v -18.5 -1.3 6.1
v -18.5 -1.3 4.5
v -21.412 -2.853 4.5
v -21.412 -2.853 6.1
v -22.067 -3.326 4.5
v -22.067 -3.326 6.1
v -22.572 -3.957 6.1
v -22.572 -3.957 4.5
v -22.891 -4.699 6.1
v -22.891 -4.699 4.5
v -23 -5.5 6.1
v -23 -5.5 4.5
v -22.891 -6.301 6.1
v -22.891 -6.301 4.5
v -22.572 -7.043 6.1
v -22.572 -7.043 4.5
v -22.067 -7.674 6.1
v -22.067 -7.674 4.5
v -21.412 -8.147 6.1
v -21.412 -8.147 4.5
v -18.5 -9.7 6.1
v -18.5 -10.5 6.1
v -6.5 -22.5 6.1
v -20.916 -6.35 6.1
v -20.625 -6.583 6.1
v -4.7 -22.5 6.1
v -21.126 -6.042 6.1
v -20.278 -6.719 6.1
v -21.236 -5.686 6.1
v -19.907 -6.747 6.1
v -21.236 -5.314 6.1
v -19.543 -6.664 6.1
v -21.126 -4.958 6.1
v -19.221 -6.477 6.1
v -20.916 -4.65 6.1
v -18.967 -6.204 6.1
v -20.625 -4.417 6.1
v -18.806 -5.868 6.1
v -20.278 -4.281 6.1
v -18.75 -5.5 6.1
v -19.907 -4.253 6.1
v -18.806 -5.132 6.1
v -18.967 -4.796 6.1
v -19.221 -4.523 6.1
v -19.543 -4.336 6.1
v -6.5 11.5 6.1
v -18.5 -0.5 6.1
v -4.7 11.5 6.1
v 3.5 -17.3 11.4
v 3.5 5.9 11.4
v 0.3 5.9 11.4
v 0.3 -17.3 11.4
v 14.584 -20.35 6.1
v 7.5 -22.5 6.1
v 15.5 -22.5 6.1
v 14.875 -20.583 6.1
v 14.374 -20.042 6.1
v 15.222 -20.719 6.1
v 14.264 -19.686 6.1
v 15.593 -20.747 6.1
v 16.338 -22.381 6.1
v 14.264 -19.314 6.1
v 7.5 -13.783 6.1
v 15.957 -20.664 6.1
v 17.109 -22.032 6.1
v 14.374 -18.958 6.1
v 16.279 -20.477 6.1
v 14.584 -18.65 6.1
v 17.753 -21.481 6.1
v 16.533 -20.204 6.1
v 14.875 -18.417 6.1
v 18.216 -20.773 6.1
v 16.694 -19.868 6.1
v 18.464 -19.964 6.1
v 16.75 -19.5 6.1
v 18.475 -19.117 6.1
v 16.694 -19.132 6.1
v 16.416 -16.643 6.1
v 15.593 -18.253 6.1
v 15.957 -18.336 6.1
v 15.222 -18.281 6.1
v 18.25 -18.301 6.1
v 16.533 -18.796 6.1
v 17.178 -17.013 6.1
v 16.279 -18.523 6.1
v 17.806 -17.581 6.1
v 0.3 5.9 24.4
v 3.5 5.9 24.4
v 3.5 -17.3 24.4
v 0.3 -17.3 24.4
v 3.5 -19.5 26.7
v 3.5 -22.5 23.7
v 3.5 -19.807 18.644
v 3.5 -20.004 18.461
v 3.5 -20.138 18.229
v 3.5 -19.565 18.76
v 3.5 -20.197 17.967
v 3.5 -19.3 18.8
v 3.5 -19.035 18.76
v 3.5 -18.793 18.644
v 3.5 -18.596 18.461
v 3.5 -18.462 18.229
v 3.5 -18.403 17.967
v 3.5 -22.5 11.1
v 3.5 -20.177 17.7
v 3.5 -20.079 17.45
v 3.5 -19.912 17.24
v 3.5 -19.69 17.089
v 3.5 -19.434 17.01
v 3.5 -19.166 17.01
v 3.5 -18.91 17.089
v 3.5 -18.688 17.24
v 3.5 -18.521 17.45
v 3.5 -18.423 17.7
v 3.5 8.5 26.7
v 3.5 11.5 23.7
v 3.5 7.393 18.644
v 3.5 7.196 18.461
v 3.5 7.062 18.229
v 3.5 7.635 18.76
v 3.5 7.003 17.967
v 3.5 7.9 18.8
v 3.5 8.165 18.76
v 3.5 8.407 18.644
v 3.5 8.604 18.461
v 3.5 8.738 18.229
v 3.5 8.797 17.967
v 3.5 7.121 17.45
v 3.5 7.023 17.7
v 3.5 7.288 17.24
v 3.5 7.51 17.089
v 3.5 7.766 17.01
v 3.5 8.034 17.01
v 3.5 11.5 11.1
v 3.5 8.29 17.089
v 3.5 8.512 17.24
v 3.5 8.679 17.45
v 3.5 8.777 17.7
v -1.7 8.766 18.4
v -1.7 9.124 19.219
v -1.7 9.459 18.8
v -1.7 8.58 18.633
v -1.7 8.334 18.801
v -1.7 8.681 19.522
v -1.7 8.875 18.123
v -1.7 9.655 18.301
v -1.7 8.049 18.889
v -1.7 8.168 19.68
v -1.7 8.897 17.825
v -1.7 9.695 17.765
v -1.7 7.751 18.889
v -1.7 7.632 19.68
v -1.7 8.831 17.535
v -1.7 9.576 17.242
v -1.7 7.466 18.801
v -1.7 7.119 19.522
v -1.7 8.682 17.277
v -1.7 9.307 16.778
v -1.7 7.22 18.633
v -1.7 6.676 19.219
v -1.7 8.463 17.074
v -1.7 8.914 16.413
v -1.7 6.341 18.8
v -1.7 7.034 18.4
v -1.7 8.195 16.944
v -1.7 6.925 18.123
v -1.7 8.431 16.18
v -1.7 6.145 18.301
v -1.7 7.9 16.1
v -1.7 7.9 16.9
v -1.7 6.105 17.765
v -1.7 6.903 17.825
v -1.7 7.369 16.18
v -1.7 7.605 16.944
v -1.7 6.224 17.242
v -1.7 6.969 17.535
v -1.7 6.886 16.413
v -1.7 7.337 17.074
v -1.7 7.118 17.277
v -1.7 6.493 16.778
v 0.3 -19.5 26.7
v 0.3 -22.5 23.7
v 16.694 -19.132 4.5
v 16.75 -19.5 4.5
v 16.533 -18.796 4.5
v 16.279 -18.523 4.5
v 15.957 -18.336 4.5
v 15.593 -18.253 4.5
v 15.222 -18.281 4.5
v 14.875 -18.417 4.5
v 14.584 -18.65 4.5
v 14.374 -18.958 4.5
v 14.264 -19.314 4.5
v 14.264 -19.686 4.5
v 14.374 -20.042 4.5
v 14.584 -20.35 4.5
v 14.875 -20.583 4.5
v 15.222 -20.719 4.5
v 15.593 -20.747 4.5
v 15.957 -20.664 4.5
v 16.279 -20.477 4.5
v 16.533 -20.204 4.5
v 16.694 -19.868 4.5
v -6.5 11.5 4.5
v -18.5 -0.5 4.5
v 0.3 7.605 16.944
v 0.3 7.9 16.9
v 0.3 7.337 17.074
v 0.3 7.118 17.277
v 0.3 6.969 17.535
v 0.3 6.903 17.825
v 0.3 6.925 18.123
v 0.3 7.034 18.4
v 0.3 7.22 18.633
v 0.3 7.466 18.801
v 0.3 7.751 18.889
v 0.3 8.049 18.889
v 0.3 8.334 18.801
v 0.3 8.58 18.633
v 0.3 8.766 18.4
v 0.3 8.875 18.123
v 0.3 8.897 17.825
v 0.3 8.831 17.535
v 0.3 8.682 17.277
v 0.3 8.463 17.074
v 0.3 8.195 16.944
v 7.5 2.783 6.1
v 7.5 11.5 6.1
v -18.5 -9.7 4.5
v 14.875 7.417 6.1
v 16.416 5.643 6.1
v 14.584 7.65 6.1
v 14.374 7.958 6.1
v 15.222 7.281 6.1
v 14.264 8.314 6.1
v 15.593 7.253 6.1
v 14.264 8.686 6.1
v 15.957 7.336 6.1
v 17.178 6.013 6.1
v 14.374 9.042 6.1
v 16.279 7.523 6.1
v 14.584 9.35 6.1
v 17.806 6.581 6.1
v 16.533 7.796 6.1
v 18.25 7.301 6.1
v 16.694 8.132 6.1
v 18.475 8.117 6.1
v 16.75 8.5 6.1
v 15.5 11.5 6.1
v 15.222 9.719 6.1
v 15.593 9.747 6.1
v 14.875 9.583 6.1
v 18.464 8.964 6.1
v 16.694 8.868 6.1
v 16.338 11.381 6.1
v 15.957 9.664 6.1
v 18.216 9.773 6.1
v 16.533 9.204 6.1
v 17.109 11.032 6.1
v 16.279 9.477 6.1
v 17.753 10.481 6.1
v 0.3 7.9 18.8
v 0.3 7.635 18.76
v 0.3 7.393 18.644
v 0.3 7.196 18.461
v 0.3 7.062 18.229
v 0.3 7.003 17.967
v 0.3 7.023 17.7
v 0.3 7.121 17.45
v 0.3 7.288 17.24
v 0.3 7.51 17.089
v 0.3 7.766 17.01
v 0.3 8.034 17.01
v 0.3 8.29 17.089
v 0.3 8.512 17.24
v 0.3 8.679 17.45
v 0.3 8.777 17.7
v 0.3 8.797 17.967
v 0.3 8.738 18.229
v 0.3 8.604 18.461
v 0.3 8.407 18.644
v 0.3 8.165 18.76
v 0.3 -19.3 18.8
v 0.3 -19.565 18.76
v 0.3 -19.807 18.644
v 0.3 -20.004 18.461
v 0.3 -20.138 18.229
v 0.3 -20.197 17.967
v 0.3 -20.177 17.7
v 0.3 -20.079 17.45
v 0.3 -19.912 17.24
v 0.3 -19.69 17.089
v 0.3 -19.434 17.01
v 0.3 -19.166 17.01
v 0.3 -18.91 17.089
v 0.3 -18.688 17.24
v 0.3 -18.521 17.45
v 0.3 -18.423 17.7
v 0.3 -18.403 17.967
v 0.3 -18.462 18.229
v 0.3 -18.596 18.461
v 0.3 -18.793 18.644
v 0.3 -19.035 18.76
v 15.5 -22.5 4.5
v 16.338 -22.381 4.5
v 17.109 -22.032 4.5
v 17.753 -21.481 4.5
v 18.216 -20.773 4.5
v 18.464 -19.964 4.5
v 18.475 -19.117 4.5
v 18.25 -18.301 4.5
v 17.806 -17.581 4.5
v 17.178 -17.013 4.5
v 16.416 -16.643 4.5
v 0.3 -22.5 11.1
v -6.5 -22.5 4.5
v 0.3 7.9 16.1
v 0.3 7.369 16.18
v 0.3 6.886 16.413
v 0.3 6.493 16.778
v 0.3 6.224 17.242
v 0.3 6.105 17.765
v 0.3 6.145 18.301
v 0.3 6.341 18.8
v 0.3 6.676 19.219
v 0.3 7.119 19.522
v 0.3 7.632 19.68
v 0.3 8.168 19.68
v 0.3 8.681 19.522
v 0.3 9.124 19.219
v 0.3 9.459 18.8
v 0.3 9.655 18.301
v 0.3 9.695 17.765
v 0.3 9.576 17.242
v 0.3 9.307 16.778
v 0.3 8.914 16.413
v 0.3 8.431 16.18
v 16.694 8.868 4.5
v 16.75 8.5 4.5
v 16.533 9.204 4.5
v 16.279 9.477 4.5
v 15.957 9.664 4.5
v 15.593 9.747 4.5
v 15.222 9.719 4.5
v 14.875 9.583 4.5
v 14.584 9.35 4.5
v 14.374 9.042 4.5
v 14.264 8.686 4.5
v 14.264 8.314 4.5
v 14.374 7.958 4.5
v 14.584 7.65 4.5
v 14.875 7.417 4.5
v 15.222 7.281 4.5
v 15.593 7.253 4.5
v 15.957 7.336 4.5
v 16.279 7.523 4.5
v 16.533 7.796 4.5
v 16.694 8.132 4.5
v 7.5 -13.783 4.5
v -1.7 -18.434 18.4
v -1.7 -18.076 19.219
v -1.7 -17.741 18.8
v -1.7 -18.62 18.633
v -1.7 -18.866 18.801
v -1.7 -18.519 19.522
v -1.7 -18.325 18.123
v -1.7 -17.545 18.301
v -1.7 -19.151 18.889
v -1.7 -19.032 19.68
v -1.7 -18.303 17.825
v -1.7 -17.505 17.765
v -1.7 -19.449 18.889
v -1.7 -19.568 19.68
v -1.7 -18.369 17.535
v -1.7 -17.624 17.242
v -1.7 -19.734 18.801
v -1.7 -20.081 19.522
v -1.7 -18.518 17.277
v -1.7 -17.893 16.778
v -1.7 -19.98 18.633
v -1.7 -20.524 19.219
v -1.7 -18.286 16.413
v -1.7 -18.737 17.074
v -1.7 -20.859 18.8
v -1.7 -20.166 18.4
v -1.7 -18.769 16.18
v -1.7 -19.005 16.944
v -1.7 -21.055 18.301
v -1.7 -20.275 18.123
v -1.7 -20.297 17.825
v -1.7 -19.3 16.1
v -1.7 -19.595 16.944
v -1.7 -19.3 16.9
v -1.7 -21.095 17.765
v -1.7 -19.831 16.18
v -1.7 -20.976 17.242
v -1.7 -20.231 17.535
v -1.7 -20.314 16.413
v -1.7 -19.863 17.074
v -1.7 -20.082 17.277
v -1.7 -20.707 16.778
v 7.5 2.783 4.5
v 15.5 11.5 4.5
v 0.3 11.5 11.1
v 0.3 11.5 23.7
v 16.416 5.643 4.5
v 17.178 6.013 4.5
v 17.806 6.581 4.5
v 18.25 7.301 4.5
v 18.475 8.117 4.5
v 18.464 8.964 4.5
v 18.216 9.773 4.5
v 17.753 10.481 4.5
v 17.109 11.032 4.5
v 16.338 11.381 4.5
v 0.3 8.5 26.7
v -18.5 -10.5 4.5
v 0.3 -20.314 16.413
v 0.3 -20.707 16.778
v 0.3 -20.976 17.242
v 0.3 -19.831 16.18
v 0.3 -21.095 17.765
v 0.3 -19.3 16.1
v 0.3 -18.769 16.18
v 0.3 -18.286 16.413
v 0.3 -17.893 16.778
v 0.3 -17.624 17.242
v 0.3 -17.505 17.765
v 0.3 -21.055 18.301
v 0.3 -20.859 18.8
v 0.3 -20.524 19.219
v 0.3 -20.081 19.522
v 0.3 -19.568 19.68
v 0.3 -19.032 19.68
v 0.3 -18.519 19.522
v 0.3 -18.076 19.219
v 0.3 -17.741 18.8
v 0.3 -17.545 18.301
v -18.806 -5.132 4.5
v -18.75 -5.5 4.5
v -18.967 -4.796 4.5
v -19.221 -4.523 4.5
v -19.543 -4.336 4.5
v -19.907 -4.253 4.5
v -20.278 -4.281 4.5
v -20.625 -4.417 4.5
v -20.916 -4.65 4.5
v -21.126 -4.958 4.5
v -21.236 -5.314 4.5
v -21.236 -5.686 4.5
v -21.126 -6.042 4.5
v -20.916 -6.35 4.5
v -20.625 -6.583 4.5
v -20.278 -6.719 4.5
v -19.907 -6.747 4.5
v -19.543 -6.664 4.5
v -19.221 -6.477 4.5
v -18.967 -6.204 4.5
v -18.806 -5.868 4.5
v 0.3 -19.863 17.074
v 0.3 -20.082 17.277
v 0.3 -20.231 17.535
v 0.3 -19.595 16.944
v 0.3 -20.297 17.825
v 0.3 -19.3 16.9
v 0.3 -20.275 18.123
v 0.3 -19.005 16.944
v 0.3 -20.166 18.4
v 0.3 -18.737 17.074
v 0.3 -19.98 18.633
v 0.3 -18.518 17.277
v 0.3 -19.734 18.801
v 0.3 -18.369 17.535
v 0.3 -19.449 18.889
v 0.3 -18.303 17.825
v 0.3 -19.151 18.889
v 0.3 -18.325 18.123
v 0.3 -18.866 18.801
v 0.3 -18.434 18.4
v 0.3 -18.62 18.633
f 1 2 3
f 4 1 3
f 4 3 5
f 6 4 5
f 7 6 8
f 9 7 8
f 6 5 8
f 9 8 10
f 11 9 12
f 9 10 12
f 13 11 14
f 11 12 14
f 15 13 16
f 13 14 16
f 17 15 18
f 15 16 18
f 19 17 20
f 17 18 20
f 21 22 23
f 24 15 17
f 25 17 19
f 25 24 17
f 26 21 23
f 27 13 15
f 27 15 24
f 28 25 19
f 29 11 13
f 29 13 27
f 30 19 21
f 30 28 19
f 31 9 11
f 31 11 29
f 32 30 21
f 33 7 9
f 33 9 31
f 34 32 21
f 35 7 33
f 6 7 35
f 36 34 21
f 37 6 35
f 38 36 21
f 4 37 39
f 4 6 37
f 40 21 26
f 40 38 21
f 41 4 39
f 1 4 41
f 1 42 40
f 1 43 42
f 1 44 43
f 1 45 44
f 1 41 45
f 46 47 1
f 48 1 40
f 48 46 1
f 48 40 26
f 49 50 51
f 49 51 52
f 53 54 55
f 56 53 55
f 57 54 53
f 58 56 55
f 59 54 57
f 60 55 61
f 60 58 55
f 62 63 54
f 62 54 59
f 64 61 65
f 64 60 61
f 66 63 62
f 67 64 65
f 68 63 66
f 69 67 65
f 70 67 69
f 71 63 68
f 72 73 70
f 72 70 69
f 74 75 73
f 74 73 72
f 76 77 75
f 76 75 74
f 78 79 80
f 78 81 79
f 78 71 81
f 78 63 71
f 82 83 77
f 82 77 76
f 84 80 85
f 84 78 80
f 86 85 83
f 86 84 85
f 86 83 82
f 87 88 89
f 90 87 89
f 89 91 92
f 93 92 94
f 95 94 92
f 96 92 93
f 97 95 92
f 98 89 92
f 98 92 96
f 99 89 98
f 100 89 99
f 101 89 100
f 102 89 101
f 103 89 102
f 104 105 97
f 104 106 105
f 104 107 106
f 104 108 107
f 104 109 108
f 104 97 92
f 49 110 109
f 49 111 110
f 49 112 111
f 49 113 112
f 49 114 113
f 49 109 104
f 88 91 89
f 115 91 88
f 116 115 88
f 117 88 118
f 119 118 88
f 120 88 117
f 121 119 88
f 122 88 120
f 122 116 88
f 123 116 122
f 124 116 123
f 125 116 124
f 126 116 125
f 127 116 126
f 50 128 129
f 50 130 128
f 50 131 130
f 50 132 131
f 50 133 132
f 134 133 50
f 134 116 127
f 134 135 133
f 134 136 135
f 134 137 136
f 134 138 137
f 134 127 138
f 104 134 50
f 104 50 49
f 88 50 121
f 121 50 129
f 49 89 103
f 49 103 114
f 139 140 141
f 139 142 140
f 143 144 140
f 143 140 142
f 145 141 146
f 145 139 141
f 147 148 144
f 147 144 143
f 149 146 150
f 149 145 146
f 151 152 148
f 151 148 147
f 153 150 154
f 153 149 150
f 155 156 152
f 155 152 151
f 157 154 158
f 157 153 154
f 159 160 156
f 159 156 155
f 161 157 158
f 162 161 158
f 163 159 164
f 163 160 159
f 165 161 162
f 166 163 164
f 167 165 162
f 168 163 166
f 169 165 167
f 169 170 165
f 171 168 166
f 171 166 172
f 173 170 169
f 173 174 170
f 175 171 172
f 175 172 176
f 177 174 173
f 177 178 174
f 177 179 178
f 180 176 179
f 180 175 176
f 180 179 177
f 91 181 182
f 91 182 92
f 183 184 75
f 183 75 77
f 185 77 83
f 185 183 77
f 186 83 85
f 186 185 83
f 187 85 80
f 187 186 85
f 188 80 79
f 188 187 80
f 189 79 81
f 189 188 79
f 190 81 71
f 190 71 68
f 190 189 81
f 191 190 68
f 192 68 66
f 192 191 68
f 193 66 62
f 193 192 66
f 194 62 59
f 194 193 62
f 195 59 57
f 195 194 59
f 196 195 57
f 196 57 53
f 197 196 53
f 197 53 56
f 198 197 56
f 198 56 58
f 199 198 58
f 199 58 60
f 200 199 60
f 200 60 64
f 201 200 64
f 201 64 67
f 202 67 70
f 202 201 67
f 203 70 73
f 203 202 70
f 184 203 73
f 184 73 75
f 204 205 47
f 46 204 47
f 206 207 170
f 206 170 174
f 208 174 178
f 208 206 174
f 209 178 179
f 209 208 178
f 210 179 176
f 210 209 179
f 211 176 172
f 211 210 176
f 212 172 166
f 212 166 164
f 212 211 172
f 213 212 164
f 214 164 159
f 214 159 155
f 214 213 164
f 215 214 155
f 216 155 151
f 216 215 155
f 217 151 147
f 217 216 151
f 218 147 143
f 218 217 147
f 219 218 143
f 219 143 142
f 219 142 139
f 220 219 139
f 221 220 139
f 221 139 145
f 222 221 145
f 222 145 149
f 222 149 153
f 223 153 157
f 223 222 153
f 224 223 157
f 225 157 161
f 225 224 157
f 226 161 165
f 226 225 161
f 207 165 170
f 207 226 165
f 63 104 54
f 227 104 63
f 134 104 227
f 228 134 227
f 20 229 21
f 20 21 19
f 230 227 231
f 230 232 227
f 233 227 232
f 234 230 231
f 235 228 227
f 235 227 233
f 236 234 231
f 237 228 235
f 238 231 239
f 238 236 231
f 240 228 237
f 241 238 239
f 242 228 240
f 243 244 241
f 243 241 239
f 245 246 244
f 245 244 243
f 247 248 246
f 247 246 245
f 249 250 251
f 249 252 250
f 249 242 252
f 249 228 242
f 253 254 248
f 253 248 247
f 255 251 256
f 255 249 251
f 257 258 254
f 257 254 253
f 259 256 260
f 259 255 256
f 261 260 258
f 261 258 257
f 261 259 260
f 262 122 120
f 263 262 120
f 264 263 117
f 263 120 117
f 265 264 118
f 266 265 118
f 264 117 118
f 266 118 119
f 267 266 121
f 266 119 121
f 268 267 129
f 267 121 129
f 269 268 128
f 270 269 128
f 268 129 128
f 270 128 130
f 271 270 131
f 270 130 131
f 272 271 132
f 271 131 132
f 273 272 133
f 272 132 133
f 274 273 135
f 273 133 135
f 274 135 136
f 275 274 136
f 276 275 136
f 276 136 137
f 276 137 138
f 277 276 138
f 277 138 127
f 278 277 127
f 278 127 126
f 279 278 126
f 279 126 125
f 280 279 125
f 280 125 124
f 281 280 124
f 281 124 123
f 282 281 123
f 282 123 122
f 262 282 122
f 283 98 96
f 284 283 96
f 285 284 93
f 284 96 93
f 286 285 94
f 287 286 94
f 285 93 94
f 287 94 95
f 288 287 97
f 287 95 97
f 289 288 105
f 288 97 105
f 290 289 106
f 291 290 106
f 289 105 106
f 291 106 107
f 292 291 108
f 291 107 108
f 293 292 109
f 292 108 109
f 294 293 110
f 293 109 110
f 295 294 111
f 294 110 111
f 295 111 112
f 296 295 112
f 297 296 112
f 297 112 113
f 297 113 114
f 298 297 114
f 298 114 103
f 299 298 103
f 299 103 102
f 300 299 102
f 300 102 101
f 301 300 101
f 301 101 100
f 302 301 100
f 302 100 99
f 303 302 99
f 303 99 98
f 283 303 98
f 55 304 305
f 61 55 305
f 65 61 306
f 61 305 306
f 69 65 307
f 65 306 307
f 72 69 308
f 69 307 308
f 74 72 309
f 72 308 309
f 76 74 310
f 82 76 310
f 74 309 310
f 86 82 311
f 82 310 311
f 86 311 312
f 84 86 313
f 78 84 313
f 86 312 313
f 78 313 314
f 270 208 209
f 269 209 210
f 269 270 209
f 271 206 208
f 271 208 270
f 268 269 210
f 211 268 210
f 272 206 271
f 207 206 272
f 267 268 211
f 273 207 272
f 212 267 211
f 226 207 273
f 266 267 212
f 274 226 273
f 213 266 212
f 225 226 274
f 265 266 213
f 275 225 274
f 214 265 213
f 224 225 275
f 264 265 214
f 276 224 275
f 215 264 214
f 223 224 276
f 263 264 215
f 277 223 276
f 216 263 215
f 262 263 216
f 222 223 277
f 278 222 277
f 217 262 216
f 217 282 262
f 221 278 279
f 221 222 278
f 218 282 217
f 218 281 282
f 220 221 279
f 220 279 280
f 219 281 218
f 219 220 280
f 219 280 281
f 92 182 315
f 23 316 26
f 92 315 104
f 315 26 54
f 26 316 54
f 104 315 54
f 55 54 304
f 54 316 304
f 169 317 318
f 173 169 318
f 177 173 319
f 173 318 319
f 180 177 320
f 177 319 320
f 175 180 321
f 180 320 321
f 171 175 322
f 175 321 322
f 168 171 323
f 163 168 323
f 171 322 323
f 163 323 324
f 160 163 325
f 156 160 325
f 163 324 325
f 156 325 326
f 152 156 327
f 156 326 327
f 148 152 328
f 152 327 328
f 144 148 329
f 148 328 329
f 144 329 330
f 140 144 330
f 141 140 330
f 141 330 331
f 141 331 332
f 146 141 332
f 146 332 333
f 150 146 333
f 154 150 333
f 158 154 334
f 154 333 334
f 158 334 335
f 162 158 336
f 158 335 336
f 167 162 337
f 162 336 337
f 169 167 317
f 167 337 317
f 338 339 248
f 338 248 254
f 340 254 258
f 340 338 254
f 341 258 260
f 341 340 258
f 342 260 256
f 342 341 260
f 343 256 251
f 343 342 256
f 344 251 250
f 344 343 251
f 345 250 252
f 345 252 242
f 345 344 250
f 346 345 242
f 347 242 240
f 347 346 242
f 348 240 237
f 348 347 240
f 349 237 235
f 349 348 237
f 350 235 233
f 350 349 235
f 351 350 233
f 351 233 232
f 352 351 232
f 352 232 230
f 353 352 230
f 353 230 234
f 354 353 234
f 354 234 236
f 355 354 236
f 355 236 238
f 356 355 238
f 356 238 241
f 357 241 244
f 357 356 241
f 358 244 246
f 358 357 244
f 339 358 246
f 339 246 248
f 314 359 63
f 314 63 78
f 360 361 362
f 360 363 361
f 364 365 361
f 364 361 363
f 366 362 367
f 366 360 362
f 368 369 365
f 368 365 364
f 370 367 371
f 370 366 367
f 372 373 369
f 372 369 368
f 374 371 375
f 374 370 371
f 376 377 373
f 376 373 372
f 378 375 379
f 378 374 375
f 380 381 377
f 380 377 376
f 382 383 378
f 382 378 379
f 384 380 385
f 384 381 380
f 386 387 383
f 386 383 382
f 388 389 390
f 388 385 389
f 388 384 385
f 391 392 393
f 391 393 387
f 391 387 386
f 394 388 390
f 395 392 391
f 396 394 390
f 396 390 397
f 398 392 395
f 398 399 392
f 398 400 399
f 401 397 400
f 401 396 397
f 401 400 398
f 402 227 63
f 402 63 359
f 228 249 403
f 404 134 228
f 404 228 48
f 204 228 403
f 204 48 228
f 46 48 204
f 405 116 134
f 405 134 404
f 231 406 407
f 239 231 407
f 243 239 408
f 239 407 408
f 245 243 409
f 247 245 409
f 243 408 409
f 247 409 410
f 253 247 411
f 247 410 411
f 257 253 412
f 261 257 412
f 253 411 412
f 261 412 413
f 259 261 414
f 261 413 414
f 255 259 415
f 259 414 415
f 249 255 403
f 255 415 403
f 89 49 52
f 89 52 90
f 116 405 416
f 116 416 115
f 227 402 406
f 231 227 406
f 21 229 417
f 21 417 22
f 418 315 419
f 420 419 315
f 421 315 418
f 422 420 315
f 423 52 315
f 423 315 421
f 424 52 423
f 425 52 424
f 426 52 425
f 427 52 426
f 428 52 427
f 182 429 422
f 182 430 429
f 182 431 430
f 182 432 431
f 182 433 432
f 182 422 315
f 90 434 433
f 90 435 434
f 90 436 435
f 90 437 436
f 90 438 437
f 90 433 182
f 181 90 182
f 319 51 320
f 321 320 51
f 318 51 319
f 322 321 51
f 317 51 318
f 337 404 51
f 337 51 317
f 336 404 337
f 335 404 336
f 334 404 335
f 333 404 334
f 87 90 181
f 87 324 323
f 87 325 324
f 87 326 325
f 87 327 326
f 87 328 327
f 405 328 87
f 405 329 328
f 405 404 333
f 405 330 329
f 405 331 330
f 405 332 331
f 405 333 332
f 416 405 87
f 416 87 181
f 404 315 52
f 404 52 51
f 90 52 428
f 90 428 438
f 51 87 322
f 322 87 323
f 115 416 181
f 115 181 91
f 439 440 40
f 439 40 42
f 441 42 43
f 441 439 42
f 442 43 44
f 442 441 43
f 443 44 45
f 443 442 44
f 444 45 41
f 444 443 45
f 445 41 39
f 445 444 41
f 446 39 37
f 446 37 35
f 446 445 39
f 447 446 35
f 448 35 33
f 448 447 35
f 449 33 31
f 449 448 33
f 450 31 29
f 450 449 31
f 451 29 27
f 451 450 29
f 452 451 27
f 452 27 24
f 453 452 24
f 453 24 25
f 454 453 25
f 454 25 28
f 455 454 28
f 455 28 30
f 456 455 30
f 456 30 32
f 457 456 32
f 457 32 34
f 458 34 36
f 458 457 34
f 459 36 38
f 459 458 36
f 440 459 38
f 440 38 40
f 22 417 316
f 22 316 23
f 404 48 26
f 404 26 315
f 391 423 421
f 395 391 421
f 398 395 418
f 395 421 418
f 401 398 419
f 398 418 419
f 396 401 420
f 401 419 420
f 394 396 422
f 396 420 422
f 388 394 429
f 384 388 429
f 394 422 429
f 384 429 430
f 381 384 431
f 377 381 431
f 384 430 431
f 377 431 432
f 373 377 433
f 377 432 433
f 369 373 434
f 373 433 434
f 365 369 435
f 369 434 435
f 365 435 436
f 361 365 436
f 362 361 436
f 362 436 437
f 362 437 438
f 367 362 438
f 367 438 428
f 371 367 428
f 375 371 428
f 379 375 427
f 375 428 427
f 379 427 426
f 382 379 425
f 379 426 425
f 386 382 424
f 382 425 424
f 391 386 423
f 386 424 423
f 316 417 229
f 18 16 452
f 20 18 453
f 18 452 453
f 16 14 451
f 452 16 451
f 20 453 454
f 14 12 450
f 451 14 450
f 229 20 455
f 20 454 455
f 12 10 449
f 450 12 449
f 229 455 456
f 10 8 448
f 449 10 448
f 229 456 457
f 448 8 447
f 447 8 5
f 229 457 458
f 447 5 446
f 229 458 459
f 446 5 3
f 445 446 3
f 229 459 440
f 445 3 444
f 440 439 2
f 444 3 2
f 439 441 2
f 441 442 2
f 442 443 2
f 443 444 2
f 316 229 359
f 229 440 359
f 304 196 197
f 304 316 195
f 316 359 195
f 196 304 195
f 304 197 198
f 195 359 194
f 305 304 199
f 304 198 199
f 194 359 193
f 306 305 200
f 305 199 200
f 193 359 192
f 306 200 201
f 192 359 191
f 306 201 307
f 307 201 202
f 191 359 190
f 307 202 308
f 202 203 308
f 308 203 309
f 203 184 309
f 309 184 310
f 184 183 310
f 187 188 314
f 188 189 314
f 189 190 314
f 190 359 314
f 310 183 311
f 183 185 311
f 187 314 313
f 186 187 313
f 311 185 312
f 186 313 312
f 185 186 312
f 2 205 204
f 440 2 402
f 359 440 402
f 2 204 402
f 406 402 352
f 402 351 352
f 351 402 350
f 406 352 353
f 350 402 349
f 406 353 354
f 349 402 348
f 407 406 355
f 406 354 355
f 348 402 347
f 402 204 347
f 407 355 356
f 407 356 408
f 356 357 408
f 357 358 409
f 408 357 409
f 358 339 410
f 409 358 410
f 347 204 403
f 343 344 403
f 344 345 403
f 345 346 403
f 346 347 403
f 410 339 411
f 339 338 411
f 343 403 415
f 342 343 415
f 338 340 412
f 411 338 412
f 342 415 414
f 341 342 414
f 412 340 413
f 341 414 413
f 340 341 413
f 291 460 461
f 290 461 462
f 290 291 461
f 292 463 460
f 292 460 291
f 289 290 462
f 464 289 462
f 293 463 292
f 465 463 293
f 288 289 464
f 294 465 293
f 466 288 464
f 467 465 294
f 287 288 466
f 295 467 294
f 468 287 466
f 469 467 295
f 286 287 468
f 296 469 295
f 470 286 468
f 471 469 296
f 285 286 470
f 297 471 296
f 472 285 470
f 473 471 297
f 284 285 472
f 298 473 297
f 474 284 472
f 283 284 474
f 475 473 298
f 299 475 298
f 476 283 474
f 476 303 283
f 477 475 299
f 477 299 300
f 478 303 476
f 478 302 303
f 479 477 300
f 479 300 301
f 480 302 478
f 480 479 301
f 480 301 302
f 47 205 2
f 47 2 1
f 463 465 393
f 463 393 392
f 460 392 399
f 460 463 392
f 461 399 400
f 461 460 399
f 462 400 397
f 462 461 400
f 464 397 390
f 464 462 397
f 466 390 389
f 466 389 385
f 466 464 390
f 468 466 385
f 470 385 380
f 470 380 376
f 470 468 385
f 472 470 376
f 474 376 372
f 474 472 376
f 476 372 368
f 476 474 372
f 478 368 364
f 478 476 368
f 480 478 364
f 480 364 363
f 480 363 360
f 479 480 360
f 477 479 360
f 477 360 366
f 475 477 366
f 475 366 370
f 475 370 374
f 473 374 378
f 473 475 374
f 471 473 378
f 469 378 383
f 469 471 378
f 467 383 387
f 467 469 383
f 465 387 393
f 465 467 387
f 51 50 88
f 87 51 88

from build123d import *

# Parameters (mm, degrees)
PAD002_DEPTH    = 34
SKETCH003_R     = 0.9
POCKET001_DEPTH = 22.001
SKETCH005_W     = 13
SKETCH005_H     = 23.2
POCKET002_DEPTH = 22.001
SKETCH006_R     = 1.25
PAD003_DEPTH    = 1.6
SKETCH007_R     = 1.25
PAD004_DEPTH    = 1.6
SKETCH009_R     = 1.8
SKETCH009_R_2   = 1
PAD005_DEPTH    = 2
CHAMFER_SIZE    = 3
CHAMFER001_SIZE = 12


with BuildPart() as part:
    # Sketch004 → Pad002 (new body)
    with BuildSketch(Plane.XZ):
        Polygon((-22, 1.6), (-8.2, 1.6), (-3.2, 6.6), (-3.2, 22.2), (0, 22.2), (0, 6.6), (4, 1.6), (4, 0), (-3.601763, 0), (-22, 0), align=None)
    extrude(amount=PAD002_DEPTH)

    # Sketch003 → Pocket001 (cut, through all)
    with BuildSketch(Plane(origin=(0, 0, 0), x_dir=(0, 0, 1), z_dir=(1, 0, 0))):
        with Locations((13.4, 30.8)):
            Circle(SKETCH003_R)
        with Locations((13.4, 3.6)):
            Circle(SKETCH003_R)
    extrude(amount=-POCKET001_DEPTH, mode=Mode.SUBTRACT)

    # Sketch005 (on DatumPlane) → Pocket002 (cut, through all)
    with BuildSketch(Plane(origin=(0, 0, 0), x_dir=(0, 0, 1), z_dir=(1, 0, 0))):
        with Locations((13.4, 17.2)):
            Rectangle(SKETCH005_W, SKETCH005_H)
    extrude(amount=-POCKET002_DEPTH, mode=Mode.SUBTRACT)

    # Sketch006 → Pad003 (join)
    with BuildSketch(Plane.XY):
        with BuildLine():
            ThreePointArc((-24.911765, -14.352941), (-26.5, -17), (-24.911765, -19.647059))
            Line((-20.5, -22), (-24.911765, -19.647059))
            Line((-20.5, -12), (-20.5, -22))
            Line((-20.5, -12), (-24.911765, -14.352941))
        make_face()
        with Locations((-23.5, -17)):
            Circle(SKETCH006_R, mode=Mode.SUBTRACT)
    extrude(amount=PAD003_DEPTH)

    # Sketch007 → Pad004 (join)
    with BuildSketch(Plane.XY):
        with BuildLine():
            ThreePointArc((12, -34), (14.963938, -31.463756), (12.916362, -28.143379))
            Line((0, -24), (12.916362, -28.143379))
            Line((0, -34), (0, -24))
            Line((0, -34), (12, -34))
        make_face()
        with Locations((12, -31)):
            Circle(SKETCH007_R, mode=Mode.SUBTRACT)
        with BuildLine():
            ThreePointArc((12.916362, -5.856621), (14.96394, -2.536256), (12.000023, 0))
            Line((0, 0), (12.000023, 0))
            Line((0, 0), (0, -10))
            Line((0, -10), (12.916362, -5.856621))
        make_face()
        with Locations((12, -3)):
            Circle(SKETCH007_R, mode=Mode.SUBTRACT)
    extrude(amount=PAD004_DEPTH)

    # Sketch009 (on Face2 of Pad004) → Pad005 (join)
    with BuildSketch(Plane(origin=(-3.2, 0, 0), x_dir=(0, 0, -1), z_dir=(-1, 0, 0))):
        with Locations((-13.4, 30.8)):
            Circle(SKETCH009_R)
        with Locations((-13.4, 30.8)):
            Circle(SKETCH009_R_2, mode=Mode.SUBTRACT)
        with Locations((-13.4, 3.6)):
            Circle(SKETCH009_R)
        with Locations((-13.4, 3.6)):
            Circle(SKETCH009_R_2, mode=Mode.SUBTRACT)
    extrude(amount=PAD005_DEPTH)

    # Chamfer
    chamfer_edges = [part.edges().sort_by_distance(p)[0] for p in [
        (-1.6, -34, 22.2),
        (-1.6, 0, 22.2),
    ]]
    chamfer(chamfer_edges, length=CHAMFER_SIZE)

    # Chamfer001
    chamfer001_edges = [part.edges().sort_by_distance(p)[0] for p in [
        (-22, -34, 0.8),
        (-22, 0, 0.8),
    ]]
    chamfer(chamfer001_edges, length=CHAMFER001_SIZE)


with BuildPart() as part_1:
    # Body001 placement: moved
    add(part.part.moved(Location((3.5, 11.5, 4.5))))


solid = part_1.part
